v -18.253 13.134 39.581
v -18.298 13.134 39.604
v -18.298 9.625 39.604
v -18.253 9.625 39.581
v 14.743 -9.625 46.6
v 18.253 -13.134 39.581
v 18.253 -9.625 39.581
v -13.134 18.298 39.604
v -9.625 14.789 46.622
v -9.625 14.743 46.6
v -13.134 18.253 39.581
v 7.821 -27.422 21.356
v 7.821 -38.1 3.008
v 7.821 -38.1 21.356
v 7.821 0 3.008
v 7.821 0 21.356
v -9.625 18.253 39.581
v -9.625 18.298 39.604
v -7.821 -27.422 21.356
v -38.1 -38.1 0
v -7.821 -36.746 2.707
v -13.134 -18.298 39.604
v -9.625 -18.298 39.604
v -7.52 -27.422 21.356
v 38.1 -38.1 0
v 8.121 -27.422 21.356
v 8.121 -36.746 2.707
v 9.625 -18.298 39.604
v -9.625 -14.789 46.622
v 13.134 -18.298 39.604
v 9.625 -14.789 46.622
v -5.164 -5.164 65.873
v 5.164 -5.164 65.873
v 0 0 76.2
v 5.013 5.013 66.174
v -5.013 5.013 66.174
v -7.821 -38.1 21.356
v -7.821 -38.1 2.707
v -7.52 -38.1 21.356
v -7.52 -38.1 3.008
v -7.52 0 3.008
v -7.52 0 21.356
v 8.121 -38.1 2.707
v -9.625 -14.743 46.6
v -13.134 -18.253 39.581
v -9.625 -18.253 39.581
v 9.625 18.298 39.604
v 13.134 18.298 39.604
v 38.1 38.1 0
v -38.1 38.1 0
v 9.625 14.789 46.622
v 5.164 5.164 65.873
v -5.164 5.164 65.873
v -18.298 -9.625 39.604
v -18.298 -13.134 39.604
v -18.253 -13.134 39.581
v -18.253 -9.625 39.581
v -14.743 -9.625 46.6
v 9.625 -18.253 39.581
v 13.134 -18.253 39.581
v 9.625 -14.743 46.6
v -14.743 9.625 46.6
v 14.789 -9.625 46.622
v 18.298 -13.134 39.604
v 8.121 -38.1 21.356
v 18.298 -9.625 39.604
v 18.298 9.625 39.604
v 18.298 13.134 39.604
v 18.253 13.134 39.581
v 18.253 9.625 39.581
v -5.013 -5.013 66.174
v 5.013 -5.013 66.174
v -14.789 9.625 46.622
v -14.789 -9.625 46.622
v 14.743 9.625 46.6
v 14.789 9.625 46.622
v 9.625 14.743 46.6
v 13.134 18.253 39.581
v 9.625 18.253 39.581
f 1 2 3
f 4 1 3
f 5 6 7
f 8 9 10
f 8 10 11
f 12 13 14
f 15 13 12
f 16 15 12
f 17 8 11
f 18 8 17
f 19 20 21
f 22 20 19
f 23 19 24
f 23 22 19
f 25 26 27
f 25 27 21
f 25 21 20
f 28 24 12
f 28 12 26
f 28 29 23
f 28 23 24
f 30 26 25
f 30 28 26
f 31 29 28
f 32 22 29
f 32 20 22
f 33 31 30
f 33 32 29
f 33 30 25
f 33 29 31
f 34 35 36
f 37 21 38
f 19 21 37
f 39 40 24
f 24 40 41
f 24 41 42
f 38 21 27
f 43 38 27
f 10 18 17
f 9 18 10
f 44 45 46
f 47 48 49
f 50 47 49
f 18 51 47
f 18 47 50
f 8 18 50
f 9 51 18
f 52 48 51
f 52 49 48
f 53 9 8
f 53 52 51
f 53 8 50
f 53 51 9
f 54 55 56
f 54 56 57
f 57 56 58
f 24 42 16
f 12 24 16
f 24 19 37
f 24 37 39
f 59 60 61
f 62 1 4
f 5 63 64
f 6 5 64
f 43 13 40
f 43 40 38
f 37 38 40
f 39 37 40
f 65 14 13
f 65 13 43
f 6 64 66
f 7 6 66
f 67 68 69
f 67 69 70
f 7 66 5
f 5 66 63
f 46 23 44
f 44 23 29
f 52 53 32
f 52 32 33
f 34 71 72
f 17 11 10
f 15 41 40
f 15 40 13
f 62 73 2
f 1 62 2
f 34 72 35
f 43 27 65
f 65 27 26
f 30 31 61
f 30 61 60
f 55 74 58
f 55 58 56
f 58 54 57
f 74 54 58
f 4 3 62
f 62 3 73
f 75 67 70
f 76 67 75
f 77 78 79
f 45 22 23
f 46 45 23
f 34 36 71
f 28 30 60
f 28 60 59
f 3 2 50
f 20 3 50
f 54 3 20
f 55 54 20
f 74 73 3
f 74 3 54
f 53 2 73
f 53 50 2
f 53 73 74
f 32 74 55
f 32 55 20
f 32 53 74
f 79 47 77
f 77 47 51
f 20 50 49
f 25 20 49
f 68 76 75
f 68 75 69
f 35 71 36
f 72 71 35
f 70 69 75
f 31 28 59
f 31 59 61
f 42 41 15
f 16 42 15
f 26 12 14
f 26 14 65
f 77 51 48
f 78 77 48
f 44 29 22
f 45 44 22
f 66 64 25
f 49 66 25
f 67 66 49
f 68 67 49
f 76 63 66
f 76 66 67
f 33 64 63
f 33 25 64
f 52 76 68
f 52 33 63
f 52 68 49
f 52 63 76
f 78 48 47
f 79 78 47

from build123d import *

# Parameters (mm, degrees)
F0_W             = 75.7989510894
F0_H             = 76.0997384787
F1_DEPTH         = 76.2
F2_W             = 94.859868288
F2_H             = 5.5733323097
F3_DEPTH         = 81.28
F5_DEPTH         = 81.28
F7_W             = 38.1
F7_H             = 38.1
F14_W            = 33.9892096817
F14_H            = 0.3007873893
F15_DEPTH        = 254
F15_DEPTH_BACK   = 127
F17_DEPTH        = 0.0508
F17_COPIES_COUNT = 4
F19_W            = 15.9418433905
F19_H            = 18.6489464249
F20_DEPTH        = 38.1
F21_W            = 15.3402625583
F21_H            = 18.348157173
F22_DEPTH        = 101.6


# Not quite as in the source:
# - a pattern or mirror of a feature is missing from the dataset's text; its kind, count and spacing are read off the source's solid


with BuildPart() as f1:
    # F0 (on Front) → F1 (new body)
    with BuildSketch(Plane.XZ):
        with Locations((37.8994755447, -38.0498692393)):
            Rectangle(F0_W, F0_H)
    extrude(amount=F1_DEPTH)

    # F2 (on face) → F3 (cut)
    with BuildSketch(Plane.XZ.offset(76.2)):
        with Locations((-47.429934144, -78.8864046335)):
            Rectangle(F2_W, F2_H)
        Polygon((0, 0), (0, -76.0997384787), (37.8994755447, 0), align=None)
    extrude(amount=-F3_DEPTH, mode=Mode.SUBTRACT)

    # F4 (on face) → F5 (cut)
    with BuildSketch(Plane.XZ.offset(76.2)):
        Polygon((75.7989510894, 0), (37.8994755447, 0), (75.7989510894, -76.0997384787), align=None)
    extrude(amount=-F5_DEPTH, mode=Mode.SUBTRACT)


with BuildPart() as f10:
    # F7 (on Top) → F10 section 0
    with BuildSketch(Plane.XY, mode=Mode.PRIVATE) as f10_s0:
        with Locations((-19.05, 19.05)):
            Rectangle(F7_W, F7_H)
    loft([f10_s0.sketch, Vertex(0, 0, 76.2)])

    # F7 (on Top) → F11 section 0
    with BuildSketch(Plane.XY, mode=Mode.PRIVATE) as f11_s0:
        with Locations((-19.05, -19.05)):
            Rectangle(F7_W, F7_H)
    loft([f11_s0.sketch, Vertex(0, 0, 76.2)])

    # F7 (on Top) → F12 section 0
    with BuildSketch(Plane.XY, mode=Mode.PRIVATE) as f12_s0:
        with Locations((19.05, -19.05)):
            Rectangle(F7_W, F7_H)
    loft([f12_s0.sketch, Vertex(0, 0, 76.2)])

    # F7 (on Top) → F13 section 0
    with BuildSketch(Plane.XY, mode=Mode.PRIVATE) as f13_s0:
        with Locations((19.05, 19.05)):
            Rectangle(F7_W, F7_H)
    loft([f13_s0.sketch, Vertex(0, 0, 76.2)])

    # F14 (on Front) → F15 (cut, two sides)
    with BuildSketch(Plane.XZ) as f15_sk:
        with Locations((0.4511848092, 66.0232938826)):
            Rectangle(F14_W, F14_H)
    extrude(amount=-F15_DEPTH, mode=Mode.SUBTRACT)
    extrude(f15_sk.sketch, amount=F15_DEPTH_BACK, mode=Mode.SUBTRACT)

    # F16 (on face) → F17 (cut)
    with BuildSketch(Plane(origin=(30.48, 0, 15.24), x_dir=(0, 1, 0), z_dir=(0.894427191, 0, 0.4472135955))):
        Polygon((-9.6252635121, 27.2397237785), (-9.6252635121, 35.0865572691), (-13.1344741307, 27.2397237785), align=None)
    f17 = extrude(amount=-F17_DEPTH, mode=Mode.SUBTRACT)

    # F17_copies: F17 ×4 about axis
    f17_copies_axis = Axis((0, 0, 0), (0, 0, 1))
    for i in range(1, F17_COPIES_COUNT):
        add(f17.rotate(f17_copies_axis, i * 360 / F17_COPIES_COUNT), mode=Mode.SUBTRACT)

    # F17_copies1: F17 across plane
    add(f17.mirror(Plane(origin=(0, 0, 0), x_dir=(-0.7071067812, -0.7071067812, 0), z_dir=(-0.7071067812, 0.7071067812, 0))), mode=Mode.SUBTRACT)

    # F17_copies2: F17 across plane
    add(f17.mirror(Plane(origin=(0, 0, 0), x_dir=(0, 0, -1), z_dir=(-1, 0, 0))), mode=Mode.SUBTRACT)

    # F17_copies3: F17 across plane
    add(f17.mirror(Plane(origin=(0, 0, 0), x_dir=(0.7071067812, -0.7071067812, 0), z_dir=(-0.7071067812, -0.7071067812, 0))), mode=Mode.SUBTRACT)

    # F17_copies4: F17 across plane
    add(f17.mirror(Plane.ZX), mode=Mode.SUBTRACT)

    # F19 (on Front) → F20 (join)
    with BuildSketch(Plane.XZ):
        with Locations((0.150394626, 12.0315785753)):
            Rectangle(F19_W, F19_H)
    extrude(amount=F20_DEPTH)

    # F21 (on Front) → F22 (cut)
    with BuildSketch(Plane.XZ):
        with Locations((0.1503948588, 12.1819732012)):
            Rectangle(F21_W, F21_H)
    extrude(amount=F22_DEPTH, mode=Mode.SUBTRACT)


solid = f10.part
